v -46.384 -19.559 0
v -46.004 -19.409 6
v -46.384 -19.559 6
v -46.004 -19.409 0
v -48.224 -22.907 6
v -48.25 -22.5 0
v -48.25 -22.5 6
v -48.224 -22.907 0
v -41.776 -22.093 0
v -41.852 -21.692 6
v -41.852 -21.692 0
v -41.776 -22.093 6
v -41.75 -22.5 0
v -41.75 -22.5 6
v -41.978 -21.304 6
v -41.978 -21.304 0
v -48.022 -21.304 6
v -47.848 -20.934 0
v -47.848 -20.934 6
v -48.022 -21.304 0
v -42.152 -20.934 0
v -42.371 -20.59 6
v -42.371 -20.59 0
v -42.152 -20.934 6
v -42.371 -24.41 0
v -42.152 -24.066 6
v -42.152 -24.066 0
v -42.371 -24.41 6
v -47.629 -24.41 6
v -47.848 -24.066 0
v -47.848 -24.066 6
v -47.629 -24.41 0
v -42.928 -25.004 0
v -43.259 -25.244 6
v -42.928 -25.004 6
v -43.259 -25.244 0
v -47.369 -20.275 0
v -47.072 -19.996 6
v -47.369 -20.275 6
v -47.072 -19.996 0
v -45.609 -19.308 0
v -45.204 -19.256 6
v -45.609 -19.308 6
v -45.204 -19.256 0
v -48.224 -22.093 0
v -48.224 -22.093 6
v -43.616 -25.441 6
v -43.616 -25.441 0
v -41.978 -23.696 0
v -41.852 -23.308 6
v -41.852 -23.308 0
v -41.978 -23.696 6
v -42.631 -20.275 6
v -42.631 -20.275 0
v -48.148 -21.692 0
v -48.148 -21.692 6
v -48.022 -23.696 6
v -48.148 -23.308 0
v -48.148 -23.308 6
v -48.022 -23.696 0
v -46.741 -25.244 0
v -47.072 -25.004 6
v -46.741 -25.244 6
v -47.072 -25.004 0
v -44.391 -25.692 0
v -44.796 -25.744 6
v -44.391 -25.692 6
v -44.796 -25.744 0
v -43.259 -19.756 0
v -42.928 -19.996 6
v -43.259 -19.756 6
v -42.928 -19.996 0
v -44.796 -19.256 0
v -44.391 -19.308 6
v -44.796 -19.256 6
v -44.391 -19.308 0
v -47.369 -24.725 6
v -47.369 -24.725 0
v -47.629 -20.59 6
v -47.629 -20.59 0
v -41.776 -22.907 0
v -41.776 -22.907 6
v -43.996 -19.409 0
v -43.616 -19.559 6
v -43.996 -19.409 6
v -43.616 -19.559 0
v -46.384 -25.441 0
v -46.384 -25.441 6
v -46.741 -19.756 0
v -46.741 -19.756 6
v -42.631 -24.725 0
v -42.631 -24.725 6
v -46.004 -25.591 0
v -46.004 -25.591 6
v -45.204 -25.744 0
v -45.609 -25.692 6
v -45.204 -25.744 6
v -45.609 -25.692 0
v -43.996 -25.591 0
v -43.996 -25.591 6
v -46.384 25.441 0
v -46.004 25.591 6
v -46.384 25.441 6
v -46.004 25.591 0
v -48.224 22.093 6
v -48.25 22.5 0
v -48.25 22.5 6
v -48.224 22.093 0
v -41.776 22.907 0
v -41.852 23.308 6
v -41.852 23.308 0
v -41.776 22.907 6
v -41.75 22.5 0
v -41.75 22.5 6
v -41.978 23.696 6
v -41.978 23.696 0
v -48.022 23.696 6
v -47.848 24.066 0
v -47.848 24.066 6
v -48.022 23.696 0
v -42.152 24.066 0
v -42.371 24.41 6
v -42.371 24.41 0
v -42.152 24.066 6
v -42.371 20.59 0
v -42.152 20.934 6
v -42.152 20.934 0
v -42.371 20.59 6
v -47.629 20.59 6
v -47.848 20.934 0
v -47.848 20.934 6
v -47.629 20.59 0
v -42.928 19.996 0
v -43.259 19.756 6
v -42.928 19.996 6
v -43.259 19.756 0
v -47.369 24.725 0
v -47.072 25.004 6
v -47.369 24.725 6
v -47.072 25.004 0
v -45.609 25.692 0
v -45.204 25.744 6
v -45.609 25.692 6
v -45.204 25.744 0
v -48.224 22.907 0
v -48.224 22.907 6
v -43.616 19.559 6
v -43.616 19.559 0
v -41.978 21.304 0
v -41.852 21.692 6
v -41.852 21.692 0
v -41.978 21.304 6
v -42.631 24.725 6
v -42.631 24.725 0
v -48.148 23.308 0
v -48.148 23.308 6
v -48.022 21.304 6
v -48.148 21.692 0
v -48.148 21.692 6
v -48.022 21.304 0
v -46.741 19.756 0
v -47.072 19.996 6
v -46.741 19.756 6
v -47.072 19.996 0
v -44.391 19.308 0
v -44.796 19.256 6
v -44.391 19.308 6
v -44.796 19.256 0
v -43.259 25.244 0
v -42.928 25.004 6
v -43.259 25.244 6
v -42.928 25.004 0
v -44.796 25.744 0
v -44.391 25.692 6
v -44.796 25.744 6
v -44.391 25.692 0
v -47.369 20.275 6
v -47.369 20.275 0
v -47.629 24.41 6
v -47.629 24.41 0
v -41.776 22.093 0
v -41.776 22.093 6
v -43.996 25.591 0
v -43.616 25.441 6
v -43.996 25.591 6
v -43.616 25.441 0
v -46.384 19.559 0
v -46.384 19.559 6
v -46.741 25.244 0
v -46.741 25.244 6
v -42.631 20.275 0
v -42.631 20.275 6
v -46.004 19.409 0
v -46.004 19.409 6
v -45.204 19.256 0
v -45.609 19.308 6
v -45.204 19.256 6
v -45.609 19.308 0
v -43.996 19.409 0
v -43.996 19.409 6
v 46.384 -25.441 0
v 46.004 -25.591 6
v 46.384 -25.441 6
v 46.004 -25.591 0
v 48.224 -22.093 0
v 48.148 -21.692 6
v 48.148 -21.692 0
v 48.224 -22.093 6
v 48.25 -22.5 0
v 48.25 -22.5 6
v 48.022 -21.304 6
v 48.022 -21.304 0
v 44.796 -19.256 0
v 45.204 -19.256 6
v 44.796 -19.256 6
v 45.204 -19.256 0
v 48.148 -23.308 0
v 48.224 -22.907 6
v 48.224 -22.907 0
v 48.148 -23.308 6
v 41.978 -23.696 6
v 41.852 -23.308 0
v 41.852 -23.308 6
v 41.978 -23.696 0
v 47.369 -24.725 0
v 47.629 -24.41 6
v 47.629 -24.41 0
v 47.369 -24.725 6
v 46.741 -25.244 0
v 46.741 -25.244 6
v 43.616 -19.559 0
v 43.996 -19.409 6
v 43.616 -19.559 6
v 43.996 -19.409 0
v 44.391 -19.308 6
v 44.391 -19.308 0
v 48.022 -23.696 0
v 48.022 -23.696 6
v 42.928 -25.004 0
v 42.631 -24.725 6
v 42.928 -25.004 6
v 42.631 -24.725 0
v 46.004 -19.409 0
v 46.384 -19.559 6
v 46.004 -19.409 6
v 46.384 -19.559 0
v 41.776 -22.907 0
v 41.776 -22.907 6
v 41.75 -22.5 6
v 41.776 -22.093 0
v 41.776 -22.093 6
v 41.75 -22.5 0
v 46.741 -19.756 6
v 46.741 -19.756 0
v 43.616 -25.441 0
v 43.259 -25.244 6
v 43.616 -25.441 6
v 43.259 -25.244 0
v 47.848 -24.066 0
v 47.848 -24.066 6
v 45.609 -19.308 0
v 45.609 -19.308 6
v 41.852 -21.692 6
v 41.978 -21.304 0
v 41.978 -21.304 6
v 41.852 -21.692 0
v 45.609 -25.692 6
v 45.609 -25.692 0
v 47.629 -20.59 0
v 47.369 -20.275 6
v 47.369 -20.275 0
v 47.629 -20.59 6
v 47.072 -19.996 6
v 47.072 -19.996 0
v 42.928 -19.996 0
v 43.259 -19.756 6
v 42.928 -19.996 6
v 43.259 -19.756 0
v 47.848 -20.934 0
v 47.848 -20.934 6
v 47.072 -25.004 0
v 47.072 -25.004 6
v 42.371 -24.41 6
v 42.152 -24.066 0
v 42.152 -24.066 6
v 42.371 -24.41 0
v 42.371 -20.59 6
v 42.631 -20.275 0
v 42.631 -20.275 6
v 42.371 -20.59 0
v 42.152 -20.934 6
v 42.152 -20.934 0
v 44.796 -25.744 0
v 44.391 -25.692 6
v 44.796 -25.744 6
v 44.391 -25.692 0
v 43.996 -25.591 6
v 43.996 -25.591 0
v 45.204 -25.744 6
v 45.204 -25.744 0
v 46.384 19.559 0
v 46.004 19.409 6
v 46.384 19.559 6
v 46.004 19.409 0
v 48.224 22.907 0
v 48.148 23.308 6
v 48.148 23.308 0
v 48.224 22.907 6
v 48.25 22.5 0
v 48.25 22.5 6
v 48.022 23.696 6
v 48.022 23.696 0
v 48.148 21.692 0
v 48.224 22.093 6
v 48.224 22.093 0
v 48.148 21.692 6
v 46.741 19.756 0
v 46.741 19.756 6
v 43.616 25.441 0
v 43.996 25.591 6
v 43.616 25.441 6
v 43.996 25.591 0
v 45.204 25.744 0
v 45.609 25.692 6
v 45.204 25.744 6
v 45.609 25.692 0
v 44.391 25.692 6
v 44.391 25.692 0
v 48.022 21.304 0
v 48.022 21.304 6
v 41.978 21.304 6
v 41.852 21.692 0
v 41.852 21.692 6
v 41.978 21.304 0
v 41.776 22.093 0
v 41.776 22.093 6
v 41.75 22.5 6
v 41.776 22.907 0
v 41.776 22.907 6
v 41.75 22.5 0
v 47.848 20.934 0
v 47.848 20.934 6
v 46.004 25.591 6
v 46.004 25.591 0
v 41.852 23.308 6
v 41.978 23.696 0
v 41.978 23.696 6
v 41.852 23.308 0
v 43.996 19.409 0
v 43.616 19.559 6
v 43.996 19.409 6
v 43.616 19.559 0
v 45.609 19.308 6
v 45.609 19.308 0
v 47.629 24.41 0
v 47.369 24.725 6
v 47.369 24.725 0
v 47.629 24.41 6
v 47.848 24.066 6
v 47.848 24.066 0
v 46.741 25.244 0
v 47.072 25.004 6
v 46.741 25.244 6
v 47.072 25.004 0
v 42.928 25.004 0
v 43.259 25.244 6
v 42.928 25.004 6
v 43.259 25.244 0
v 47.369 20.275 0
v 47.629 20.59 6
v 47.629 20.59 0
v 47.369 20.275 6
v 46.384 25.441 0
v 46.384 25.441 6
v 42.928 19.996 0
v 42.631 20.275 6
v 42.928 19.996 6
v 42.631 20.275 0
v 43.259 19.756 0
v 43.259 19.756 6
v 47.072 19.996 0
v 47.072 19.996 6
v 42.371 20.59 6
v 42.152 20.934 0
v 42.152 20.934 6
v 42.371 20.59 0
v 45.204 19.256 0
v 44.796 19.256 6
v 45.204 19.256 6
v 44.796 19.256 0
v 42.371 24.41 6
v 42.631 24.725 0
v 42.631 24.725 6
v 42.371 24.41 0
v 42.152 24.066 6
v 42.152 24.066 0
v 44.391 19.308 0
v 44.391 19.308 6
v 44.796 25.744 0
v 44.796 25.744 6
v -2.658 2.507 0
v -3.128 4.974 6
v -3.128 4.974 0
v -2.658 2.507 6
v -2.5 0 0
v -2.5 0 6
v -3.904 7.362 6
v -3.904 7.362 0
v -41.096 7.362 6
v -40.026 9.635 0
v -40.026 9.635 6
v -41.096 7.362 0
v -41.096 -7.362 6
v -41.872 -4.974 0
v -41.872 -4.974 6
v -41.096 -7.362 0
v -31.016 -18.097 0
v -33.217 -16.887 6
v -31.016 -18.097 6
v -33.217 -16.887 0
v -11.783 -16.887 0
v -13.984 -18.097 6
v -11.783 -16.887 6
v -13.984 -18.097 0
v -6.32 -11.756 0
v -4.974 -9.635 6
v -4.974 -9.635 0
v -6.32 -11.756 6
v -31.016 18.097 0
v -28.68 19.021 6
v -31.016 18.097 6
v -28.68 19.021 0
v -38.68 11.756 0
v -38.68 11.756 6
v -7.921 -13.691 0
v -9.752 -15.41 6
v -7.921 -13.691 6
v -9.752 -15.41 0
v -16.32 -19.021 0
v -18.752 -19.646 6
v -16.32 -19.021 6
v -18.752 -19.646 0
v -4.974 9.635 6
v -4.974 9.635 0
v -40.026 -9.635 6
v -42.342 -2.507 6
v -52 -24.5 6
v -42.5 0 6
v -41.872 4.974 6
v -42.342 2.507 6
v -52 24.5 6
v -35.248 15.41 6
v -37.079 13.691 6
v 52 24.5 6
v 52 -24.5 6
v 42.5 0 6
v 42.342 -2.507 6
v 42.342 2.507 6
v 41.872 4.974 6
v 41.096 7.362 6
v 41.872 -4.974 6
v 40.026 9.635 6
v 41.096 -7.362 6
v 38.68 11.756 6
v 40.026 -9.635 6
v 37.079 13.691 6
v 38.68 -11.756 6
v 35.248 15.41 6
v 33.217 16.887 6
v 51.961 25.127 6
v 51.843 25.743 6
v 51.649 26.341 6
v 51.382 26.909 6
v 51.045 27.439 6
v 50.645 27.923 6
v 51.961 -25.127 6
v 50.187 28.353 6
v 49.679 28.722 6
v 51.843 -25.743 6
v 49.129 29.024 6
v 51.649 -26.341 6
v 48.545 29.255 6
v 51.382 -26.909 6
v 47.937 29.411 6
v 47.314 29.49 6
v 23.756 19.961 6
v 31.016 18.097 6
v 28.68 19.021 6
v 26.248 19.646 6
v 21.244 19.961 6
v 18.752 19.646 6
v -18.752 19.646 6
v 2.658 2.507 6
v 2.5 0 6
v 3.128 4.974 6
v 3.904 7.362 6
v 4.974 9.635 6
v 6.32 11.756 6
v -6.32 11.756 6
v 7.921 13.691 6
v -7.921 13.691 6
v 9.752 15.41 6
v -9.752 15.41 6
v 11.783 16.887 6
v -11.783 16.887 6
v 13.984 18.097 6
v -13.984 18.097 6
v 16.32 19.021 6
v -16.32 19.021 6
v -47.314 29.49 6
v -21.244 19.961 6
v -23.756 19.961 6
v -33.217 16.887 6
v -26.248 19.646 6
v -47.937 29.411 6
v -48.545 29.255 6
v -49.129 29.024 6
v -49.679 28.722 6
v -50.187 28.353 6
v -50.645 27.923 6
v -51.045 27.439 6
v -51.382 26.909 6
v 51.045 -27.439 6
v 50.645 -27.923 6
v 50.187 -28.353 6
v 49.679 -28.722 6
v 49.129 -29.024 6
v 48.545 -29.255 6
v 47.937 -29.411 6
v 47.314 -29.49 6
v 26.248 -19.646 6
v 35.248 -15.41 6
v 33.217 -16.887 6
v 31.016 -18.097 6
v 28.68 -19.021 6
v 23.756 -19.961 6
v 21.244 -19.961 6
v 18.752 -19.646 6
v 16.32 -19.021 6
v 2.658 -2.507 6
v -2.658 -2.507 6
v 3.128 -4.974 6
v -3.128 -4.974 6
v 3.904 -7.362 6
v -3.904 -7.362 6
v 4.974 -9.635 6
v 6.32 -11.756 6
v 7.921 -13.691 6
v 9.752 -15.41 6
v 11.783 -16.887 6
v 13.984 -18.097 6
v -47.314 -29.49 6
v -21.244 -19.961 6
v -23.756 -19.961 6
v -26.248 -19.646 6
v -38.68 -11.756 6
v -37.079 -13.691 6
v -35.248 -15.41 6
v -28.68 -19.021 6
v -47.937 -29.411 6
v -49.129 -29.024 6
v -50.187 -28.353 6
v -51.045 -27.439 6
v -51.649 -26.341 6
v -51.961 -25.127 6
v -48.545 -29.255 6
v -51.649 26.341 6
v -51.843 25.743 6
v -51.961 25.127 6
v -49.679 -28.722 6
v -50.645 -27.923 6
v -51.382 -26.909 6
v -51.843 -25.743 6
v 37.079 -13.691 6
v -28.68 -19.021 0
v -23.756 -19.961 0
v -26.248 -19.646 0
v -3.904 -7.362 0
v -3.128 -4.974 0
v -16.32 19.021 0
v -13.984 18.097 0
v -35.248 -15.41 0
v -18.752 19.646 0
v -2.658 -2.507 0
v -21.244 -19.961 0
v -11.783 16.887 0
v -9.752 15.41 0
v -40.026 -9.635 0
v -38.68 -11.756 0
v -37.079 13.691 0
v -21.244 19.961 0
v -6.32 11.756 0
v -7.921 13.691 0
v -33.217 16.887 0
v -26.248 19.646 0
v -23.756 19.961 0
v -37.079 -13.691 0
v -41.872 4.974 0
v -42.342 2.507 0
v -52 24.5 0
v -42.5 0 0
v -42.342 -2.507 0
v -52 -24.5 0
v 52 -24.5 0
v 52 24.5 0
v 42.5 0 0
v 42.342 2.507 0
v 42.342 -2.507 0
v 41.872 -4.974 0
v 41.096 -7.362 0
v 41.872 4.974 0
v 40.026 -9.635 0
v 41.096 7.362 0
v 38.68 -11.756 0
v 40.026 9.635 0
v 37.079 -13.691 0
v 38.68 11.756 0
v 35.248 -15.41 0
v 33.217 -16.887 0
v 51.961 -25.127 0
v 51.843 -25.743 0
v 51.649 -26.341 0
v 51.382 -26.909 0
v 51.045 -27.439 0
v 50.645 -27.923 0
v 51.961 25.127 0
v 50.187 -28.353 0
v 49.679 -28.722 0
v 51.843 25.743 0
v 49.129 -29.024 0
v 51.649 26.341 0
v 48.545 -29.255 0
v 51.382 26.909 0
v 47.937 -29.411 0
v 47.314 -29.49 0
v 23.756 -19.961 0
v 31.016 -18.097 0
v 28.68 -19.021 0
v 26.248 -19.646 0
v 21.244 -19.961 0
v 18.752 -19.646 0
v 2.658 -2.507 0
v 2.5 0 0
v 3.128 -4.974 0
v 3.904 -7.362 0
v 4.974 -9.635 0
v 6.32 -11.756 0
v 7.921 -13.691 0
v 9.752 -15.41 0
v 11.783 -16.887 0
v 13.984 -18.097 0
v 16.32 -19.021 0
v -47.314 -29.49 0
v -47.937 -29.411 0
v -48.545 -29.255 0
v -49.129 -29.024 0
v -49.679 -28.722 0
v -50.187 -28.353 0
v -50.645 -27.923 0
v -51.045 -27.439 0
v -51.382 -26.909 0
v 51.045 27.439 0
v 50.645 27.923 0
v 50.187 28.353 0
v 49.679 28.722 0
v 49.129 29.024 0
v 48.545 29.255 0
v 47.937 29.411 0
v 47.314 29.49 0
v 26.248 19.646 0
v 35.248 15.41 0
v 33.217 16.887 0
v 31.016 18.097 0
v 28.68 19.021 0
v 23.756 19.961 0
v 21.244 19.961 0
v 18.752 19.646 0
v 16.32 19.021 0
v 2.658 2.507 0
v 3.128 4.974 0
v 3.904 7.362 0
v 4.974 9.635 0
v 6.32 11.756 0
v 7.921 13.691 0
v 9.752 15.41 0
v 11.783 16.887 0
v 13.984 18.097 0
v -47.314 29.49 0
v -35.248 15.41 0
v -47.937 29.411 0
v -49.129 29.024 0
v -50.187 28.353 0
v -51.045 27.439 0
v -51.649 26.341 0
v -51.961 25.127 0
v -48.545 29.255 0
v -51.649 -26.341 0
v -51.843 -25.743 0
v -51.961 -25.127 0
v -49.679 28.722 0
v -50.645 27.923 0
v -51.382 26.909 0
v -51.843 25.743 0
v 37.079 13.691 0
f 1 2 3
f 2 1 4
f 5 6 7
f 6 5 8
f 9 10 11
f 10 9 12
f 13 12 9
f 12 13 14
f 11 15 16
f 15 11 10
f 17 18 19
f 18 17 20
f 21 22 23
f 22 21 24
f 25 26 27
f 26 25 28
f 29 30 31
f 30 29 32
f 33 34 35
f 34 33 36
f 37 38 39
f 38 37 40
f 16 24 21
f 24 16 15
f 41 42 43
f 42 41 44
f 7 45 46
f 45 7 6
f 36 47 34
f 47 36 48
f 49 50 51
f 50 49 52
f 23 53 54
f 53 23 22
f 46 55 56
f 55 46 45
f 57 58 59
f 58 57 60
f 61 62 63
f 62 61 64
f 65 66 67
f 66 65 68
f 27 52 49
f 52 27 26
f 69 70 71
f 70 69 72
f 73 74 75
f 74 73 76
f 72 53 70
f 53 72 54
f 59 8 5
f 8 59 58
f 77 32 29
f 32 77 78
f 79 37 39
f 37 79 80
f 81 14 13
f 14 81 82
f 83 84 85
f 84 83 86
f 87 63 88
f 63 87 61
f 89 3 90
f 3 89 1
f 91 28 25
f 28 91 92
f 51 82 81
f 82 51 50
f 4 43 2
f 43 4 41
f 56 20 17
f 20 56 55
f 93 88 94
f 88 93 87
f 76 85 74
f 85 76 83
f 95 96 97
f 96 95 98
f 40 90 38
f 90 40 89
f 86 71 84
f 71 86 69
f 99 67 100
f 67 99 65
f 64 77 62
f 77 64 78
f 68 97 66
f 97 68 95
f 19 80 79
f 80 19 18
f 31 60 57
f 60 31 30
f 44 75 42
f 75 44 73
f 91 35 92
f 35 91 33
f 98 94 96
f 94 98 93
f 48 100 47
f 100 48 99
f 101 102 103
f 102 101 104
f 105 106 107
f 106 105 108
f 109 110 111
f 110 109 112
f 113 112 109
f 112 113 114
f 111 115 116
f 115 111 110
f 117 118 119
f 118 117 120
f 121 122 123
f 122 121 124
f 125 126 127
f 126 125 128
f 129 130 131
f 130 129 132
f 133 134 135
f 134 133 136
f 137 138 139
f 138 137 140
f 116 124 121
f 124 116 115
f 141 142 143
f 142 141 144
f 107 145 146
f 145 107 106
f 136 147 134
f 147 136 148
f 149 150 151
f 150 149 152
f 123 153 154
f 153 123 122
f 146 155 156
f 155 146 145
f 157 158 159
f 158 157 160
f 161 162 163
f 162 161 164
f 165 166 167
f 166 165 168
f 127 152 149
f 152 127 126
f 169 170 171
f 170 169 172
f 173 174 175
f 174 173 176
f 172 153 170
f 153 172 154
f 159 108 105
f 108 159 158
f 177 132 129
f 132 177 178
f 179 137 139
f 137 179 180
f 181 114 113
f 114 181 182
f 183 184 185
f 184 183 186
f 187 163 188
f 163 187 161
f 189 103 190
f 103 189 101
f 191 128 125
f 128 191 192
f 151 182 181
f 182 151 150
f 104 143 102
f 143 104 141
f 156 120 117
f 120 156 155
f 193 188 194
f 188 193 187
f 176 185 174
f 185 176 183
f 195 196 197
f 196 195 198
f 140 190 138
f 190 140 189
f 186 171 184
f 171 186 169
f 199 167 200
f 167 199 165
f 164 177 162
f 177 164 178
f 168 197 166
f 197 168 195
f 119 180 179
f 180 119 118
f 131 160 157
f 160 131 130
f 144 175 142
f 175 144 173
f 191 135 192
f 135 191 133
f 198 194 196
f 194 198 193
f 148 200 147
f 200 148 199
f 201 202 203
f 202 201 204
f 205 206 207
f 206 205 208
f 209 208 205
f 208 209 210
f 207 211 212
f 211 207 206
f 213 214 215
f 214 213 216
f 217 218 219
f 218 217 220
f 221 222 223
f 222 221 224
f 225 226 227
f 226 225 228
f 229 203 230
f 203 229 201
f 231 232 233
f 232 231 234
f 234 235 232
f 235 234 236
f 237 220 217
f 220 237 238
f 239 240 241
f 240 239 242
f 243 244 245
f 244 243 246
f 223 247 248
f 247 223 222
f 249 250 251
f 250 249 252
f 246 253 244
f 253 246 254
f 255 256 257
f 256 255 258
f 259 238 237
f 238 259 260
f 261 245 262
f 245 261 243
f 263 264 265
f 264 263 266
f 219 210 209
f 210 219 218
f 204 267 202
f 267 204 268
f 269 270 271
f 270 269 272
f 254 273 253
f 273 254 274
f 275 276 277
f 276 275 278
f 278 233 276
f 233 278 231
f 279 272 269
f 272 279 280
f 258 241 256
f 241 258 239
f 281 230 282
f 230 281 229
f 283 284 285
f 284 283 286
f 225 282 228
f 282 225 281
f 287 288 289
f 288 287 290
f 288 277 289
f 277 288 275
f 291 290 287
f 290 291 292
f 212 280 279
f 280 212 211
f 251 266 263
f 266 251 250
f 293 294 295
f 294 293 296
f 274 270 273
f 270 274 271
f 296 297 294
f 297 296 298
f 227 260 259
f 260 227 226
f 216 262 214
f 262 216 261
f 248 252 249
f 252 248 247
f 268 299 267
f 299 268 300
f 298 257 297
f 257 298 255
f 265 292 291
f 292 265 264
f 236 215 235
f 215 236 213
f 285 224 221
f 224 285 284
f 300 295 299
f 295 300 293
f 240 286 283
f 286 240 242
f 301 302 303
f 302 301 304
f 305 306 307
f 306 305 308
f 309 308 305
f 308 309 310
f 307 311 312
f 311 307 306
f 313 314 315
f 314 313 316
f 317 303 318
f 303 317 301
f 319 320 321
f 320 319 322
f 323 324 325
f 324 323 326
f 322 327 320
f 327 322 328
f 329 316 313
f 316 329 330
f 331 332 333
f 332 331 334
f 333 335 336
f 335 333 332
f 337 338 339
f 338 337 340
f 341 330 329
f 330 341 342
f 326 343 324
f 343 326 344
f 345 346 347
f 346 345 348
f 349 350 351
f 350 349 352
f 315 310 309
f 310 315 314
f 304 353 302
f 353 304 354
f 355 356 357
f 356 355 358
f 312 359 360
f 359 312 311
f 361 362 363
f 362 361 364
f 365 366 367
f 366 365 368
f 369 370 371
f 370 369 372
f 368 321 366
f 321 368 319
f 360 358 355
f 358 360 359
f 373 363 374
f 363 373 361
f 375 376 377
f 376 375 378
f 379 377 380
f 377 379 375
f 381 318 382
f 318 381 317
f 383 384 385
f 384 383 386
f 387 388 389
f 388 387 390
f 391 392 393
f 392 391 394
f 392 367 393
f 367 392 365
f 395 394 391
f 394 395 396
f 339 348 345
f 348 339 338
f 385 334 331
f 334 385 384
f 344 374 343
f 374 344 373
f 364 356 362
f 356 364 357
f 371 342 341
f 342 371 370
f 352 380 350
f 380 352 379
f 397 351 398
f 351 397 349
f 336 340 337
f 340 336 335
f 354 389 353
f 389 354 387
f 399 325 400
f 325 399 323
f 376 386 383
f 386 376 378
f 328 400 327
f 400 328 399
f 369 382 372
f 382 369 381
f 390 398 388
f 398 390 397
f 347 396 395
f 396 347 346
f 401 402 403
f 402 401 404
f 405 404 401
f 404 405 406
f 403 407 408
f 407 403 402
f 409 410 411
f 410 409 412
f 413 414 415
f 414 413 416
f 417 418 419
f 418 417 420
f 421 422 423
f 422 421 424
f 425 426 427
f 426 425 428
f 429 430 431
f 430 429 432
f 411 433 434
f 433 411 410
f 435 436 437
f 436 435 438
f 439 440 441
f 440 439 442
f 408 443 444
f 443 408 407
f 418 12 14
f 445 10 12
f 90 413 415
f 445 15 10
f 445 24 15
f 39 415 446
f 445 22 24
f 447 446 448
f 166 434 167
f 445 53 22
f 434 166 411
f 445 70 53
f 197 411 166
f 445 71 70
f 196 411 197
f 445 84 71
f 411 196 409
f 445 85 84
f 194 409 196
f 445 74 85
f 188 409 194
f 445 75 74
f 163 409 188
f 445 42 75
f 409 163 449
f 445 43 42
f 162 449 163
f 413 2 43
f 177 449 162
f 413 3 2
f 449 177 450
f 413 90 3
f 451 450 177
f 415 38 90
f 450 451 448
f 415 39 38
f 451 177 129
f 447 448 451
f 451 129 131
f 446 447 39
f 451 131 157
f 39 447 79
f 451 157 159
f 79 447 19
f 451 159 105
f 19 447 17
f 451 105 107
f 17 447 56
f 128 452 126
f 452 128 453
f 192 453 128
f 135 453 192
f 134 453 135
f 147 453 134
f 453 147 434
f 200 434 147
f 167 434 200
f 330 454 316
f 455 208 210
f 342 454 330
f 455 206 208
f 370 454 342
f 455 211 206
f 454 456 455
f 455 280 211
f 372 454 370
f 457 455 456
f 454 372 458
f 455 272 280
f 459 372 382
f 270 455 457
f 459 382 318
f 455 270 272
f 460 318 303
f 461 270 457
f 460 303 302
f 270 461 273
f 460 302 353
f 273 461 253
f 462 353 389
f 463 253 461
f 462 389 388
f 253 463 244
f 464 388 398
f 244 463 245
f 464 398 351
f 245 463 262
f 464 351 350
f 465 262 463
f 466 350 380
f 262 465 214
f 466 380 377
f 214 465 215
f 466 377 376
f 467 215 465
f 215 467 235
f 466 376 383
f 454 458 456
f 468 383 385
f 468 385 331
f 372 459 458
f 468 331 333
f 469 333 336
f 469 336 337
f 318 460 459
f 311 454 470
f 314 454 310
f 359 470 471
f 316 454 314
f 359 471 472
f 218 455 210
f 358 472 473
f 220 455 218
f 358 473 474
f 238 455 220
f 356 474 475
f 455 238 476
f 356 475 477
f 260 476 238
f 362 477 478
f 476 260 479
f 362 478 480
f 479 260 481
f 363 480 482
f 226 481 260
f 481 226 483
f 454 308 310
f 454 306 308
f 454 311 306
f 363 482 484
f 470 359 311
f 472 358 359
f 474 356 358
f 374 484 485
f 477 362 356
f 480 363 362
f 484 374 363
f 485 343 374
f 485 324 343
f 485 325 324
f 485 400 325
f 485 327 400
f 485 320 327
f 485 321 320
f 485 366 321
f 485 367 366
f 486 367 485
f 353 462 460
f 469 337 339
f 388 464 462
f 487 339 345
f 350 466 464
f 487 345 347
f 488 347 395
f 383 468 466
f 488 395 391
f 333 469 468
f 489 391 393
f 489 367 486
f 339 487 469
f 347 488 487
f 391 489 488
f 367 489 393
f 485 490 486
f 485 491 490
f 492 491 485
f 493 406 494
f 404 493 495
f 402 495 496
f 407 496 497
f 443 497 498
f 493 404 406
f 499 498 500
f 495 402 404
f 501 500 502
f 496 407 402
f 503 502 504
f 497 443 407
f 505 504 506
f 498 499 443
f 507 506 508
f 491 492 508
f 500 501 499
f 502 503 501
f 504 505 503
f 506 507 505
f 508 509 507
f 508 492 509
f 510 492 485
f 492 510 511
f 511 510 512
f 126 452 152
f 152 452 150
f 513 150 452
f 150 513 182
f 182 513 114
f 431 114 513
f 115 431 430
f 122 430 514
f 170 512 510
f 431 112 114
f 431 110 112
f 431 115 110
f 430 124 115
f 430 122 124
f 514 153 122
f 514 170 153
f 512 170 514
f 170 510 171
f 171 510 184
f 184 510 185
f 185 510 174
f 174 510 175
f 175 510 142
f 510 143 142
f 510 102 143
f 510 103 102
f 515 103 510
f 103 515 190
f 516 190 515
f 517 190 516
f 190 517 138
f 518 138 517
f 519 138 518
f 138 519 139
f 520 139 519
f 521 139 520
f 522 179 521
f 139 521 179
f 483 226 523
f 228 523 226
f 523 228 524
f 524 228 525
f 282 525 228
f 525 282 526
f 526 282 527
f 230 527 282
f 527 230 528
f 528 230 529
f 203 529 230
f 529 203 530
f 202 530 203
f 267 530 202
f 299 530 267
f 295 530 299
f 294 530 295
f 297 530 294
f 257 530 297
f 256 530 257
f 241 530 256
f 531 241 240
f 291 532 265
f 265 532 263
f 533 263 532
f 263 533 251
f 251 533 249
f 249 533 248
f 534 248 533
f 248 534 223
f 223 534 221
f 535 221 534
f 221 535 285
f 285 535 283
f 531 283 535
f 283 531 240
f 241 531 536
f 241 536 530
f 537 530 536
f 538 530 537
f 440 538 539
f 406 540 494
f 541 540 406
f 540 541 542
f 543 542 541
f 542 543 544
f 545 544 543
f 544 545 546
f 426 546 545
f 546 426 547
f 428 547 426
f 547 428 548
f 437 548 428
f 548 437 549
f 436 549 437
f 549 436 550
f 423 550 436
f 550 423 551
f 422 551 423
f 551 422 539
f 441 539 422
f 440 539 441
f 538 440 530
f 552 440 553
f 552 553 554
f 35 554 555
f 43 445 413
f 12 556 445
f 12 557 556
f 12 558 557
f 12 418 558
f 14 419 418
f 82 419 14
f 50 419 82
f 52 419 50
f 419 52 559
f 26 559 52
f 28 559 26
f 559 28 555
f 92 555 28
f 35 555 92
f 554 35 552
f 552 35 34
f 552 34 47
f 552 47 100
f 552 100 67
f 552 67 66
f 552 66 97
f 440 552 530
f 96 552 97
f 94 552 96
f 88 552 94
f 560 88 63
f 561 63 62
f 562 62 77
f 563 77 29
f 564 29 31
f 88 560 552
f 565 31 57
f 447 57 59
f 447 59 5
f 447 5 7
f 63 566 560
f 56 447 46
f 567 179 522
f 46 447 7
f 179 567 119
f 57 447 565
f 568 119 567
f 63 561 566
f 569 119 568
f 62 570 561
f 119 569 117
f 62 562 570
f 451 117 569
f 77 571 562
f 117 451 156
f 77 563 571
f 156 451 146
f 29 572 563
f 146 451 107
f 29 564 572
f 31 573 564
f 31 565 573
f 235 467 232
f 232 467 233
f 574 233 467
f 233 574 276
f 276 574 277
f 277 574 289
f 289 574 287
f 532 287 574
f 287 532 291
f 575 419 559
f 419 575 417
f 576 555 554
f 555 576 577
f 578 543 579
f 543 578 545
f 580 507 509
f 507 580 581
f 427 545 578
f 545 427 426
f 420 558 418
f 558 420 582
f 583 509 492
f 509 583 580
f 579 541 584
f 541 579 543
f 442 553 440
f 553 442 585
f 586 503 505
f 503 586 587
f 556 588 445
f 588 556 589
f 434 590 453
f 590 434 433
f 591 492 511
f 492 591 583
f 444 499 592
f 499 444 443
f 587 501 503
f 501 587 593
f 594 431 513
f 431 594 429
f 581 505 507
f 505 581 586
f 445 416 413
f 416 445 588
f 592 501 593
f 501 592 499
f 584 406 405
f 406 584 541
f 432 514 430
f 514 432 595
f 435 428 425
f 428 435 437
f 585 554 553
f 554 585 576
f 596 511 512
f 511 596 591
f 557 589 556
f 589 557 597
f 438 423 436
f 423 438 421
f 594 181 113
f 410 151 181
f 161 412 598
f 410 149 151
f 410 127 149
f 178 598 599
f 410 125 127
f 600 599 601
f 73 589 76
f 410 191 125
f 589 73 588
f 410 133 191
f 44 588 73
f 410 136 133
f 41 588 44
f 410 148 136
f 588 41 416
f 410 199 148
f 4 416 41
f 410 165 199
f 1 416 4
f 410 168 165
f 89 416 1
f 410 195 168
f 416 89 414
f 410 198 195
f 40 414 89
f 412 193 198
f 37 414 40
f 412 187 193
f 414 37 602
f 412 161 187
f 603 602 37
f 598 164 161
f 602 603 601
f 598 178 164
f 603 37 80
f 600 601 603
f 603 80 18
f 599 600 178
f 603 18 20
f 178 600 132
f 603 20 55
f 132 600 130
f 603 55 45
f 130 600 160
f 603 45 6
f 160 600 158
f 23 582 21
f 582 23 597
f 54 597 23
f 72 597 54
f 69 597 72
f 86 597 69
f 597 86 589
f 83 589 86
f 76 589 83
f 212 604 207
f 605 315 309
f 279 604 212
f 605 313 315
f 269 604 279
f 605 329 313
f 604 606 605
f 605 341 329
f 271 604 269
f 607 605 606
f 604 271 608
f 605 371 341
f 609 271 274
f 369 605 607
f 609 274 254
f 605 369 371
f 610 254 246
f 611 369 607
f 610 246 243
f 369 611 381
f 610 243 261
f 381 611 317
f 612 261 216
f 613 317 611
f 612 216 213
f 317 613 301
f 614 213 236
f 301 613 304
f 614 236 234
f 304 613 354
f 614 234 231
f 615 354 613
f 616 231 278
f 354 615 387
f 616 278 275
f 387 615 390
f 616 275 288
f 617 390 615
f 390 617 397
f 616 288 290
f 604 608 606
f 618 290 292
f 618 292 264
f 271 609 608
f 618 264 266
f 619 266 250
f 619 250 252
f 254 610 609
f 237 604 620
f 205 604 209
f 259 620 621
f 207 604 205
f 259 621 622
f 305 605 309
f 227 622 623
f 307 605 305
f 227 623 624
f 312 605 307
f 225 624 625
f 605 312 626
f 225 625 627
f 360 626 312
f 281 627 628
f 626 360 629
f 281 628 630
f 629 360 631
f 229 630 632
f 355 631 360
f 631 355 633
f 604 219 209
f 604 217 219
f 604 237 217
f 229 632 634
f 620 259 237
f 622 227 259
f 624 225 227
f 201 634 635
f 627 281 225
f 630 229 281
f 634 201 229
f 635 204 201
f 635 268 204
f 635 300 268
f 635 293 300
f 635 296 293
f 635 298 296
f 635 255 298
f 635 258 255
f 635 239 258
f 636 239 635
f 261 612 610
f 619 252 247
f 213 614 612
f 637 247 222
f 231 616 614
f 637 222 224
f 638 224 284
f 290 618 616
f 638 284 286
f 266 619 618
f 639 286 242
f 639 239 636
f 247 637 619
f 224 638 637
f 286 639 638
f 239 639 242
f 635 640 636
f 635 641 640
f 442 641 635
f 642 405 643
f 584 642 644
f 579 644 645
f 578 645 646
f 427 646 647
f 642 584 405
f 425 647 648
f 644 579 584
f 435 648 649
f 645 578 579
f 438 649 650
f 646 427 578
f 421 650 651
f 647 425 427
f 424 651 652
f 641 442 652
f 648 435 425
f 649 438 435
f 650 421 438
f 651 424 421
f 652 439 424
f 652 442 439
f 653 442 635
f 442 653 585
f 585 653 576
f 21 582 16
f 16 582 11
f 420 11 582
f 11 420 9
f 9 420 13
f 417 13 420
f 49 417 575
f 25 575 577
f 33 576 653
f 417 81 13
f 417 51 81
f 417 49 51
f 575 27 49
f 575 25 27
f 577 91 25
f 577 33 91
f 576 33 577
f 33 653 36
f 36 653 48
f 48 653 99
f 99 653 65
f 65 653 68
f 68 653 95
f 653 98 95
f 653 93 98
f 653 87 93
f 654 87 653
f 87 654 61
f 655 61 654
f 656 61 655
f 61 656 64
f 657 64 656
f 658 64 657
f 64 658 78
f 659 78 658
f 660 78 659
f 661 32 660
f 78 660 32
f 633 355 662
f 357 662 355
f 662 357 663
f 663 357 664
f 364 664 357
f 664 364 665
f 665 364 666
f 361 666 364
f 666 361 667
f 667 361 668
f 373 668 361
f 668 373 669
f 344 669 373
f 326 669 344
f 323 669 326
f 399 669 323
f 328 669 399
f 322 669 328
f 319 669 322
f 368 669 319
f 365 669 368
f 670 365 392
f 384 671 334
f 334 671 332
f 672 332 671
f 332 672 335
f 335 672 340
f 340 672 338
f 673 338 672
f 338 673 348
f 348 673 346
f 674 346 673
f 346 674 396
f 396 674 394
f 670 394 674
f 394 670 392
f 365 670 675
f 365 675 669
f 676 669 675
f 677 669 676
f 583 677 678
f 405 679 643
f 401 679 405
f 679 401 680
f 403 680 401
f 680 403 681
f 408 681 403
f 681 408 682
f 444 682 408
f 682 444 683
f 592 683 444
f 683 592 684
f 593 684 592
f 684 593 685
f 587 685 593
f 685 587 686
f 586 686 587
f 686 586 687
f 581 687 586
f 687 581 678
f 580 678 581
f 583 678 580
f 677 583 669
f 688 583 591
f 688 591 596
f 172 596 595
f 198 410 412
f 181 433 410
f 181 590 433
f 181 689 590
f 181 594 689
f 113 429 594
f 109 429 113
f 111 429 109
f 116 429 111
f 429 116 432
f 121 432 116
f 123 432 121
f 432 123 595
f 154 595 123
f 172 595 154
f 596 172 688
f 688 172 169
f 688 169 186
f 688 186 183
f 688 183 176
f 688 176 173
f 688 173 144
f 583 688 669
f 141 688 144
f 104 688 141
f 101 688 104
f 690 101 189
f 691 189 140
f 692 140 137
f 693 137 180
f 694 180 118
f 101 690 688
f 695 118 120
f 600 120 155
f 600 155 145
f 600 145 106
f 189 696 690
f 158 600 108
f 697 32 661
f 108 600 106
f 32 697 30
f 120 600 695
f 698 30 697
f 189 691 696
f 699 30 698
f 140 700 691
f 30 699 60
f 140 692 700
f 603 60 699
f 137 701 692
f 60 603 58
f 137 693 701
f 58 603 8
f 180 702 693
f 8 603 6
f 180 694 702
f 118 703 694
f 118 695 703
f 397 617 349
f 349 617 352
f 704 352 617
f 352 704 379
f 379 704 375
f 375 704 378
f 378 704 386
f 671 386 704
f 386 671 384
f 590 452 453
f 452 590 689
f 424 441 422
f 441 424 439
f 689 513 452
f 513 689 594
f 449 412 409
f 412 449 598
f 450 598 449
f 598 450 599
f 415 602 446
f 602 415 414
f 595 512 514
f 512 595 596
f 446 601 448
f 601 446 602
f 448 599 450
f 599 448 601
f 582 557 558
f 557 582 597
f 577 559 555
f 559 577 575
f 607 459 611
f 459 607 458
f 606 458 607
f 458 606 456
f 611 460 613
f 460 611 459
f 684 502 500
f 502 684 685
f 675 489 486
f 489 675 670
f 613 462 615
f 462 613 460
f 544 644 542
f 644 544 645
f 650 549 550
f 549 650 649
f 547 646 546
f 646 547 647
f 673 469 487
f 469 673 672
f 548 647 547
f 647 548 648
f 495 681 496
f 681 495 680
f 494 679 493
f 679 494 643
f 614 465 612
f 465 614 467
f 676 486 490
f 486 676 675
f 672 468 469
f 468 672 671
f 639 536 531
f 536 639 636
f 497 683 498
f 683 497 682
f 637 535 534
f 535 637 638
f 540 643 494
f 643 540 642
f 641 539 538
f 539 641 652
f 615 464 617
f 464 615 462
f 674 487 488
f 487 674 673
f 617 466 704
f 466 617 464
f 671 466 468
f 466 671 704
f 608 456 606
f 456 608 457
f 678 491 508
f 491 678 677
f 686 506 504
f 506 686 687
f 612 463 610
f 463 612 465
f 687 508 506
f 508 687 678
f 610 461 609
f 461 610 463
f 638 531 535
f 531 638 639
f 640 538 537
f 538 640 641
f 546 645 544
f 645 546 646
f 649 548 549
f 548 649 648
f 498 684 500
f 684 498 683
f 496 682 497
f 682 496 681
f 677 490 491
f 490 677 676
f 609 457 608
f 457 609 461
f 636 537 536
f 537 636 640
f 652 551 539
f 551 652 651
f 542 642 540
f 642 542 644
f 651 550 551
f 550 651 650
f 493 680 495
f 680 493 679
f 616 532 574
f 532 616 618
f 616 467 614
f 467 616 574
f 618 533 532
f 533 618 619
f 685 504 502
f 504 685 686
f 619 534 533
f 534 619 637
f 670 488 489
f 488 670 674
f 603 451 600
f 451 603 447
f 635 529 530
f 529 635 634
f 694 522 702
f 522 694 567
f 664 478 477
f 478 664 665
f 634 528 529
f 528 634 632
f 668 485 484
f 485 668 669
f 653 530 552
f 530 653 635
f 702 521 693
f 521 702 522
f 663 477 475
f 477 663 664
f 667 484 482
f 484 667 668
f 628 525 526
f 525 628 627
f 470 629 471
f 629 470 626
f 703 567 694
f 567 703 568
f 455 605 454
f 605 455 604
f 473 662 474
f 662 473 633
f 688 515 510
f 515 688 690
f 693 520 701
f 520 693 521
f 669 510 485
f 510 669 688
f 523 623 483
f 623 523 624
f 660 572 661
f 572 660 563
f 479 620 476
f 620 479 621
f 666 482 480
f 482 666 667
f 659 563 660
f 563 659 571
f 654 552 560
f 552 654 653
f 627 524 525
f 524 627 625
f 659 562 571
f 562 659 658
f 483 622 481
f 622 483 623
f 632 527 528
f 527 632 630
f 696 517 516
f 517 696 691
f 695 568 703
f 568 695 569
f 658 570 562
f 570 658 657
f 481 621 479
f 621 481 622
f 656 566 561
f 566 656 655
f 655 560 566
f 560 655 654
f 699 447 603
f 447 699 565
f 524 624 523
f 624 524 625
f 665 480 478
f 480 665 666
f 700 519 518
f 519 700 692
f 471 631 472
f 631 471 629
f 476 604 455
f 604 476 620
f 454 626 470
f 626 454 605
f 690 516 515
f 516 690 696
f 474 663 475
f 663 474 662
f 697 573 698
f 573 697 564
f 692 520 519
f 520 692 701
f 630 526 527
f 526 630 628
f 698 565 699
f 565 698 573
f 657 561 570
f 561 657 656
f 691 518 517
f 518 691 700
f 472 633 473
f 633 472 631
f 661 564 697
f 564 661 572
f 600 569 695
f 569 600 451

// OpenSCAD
$fn = 50;


difference() {
	union() {
		hull() {
			translate(v = [-47.0000000000, 24.5000000000, 0]) {
				cylinder(h = 6, r = 5);
			}
			translate(v = [47.0000000000, 24.5000000000, 0]) {
				cylinder(h = 6, r = 5);
			}
			translate(v = [-47.0000000000, -24.5000000000, 0]) {
				cylinder(h = 6, r = 5);
			}
			translate(v = [47.0000000000, -24.5000000000, 0]) {
				cylinder(h = 6, r = 5);
			}
		}
	}
	union() {
		#translate(v = [-45.0000000000, -22.5000000000, -100.0000000000]) {
			cylinder(h = 200, r = 3.2500000000);
		}
		#translate(v = [-45.0000000000, 22.5000000000, -100.0000000000]) {
			cylinder(h = 200, r = 3.2500000000);
		}
		#translate(v = [45.0000000000, -22.5000000000, -100.0000000000]) {
			cylinder(h = 200, r = 3.2500000000);
		}
		#translate(v = [45.0000000000, 22.5000000000, -100.0000000000]) {
			cylinder(h = 200, r = 3.2500000000);
		}
		#translate(v = [-22.5000000000, 0, 0]) {
			cylinder(h = 6, r = 20.0000000000);
		}
		#translate(v = [22.5000000000, 0, 0]) {
			cylinder(h = 6, r = 20.0000000000);
		}
	}
}
